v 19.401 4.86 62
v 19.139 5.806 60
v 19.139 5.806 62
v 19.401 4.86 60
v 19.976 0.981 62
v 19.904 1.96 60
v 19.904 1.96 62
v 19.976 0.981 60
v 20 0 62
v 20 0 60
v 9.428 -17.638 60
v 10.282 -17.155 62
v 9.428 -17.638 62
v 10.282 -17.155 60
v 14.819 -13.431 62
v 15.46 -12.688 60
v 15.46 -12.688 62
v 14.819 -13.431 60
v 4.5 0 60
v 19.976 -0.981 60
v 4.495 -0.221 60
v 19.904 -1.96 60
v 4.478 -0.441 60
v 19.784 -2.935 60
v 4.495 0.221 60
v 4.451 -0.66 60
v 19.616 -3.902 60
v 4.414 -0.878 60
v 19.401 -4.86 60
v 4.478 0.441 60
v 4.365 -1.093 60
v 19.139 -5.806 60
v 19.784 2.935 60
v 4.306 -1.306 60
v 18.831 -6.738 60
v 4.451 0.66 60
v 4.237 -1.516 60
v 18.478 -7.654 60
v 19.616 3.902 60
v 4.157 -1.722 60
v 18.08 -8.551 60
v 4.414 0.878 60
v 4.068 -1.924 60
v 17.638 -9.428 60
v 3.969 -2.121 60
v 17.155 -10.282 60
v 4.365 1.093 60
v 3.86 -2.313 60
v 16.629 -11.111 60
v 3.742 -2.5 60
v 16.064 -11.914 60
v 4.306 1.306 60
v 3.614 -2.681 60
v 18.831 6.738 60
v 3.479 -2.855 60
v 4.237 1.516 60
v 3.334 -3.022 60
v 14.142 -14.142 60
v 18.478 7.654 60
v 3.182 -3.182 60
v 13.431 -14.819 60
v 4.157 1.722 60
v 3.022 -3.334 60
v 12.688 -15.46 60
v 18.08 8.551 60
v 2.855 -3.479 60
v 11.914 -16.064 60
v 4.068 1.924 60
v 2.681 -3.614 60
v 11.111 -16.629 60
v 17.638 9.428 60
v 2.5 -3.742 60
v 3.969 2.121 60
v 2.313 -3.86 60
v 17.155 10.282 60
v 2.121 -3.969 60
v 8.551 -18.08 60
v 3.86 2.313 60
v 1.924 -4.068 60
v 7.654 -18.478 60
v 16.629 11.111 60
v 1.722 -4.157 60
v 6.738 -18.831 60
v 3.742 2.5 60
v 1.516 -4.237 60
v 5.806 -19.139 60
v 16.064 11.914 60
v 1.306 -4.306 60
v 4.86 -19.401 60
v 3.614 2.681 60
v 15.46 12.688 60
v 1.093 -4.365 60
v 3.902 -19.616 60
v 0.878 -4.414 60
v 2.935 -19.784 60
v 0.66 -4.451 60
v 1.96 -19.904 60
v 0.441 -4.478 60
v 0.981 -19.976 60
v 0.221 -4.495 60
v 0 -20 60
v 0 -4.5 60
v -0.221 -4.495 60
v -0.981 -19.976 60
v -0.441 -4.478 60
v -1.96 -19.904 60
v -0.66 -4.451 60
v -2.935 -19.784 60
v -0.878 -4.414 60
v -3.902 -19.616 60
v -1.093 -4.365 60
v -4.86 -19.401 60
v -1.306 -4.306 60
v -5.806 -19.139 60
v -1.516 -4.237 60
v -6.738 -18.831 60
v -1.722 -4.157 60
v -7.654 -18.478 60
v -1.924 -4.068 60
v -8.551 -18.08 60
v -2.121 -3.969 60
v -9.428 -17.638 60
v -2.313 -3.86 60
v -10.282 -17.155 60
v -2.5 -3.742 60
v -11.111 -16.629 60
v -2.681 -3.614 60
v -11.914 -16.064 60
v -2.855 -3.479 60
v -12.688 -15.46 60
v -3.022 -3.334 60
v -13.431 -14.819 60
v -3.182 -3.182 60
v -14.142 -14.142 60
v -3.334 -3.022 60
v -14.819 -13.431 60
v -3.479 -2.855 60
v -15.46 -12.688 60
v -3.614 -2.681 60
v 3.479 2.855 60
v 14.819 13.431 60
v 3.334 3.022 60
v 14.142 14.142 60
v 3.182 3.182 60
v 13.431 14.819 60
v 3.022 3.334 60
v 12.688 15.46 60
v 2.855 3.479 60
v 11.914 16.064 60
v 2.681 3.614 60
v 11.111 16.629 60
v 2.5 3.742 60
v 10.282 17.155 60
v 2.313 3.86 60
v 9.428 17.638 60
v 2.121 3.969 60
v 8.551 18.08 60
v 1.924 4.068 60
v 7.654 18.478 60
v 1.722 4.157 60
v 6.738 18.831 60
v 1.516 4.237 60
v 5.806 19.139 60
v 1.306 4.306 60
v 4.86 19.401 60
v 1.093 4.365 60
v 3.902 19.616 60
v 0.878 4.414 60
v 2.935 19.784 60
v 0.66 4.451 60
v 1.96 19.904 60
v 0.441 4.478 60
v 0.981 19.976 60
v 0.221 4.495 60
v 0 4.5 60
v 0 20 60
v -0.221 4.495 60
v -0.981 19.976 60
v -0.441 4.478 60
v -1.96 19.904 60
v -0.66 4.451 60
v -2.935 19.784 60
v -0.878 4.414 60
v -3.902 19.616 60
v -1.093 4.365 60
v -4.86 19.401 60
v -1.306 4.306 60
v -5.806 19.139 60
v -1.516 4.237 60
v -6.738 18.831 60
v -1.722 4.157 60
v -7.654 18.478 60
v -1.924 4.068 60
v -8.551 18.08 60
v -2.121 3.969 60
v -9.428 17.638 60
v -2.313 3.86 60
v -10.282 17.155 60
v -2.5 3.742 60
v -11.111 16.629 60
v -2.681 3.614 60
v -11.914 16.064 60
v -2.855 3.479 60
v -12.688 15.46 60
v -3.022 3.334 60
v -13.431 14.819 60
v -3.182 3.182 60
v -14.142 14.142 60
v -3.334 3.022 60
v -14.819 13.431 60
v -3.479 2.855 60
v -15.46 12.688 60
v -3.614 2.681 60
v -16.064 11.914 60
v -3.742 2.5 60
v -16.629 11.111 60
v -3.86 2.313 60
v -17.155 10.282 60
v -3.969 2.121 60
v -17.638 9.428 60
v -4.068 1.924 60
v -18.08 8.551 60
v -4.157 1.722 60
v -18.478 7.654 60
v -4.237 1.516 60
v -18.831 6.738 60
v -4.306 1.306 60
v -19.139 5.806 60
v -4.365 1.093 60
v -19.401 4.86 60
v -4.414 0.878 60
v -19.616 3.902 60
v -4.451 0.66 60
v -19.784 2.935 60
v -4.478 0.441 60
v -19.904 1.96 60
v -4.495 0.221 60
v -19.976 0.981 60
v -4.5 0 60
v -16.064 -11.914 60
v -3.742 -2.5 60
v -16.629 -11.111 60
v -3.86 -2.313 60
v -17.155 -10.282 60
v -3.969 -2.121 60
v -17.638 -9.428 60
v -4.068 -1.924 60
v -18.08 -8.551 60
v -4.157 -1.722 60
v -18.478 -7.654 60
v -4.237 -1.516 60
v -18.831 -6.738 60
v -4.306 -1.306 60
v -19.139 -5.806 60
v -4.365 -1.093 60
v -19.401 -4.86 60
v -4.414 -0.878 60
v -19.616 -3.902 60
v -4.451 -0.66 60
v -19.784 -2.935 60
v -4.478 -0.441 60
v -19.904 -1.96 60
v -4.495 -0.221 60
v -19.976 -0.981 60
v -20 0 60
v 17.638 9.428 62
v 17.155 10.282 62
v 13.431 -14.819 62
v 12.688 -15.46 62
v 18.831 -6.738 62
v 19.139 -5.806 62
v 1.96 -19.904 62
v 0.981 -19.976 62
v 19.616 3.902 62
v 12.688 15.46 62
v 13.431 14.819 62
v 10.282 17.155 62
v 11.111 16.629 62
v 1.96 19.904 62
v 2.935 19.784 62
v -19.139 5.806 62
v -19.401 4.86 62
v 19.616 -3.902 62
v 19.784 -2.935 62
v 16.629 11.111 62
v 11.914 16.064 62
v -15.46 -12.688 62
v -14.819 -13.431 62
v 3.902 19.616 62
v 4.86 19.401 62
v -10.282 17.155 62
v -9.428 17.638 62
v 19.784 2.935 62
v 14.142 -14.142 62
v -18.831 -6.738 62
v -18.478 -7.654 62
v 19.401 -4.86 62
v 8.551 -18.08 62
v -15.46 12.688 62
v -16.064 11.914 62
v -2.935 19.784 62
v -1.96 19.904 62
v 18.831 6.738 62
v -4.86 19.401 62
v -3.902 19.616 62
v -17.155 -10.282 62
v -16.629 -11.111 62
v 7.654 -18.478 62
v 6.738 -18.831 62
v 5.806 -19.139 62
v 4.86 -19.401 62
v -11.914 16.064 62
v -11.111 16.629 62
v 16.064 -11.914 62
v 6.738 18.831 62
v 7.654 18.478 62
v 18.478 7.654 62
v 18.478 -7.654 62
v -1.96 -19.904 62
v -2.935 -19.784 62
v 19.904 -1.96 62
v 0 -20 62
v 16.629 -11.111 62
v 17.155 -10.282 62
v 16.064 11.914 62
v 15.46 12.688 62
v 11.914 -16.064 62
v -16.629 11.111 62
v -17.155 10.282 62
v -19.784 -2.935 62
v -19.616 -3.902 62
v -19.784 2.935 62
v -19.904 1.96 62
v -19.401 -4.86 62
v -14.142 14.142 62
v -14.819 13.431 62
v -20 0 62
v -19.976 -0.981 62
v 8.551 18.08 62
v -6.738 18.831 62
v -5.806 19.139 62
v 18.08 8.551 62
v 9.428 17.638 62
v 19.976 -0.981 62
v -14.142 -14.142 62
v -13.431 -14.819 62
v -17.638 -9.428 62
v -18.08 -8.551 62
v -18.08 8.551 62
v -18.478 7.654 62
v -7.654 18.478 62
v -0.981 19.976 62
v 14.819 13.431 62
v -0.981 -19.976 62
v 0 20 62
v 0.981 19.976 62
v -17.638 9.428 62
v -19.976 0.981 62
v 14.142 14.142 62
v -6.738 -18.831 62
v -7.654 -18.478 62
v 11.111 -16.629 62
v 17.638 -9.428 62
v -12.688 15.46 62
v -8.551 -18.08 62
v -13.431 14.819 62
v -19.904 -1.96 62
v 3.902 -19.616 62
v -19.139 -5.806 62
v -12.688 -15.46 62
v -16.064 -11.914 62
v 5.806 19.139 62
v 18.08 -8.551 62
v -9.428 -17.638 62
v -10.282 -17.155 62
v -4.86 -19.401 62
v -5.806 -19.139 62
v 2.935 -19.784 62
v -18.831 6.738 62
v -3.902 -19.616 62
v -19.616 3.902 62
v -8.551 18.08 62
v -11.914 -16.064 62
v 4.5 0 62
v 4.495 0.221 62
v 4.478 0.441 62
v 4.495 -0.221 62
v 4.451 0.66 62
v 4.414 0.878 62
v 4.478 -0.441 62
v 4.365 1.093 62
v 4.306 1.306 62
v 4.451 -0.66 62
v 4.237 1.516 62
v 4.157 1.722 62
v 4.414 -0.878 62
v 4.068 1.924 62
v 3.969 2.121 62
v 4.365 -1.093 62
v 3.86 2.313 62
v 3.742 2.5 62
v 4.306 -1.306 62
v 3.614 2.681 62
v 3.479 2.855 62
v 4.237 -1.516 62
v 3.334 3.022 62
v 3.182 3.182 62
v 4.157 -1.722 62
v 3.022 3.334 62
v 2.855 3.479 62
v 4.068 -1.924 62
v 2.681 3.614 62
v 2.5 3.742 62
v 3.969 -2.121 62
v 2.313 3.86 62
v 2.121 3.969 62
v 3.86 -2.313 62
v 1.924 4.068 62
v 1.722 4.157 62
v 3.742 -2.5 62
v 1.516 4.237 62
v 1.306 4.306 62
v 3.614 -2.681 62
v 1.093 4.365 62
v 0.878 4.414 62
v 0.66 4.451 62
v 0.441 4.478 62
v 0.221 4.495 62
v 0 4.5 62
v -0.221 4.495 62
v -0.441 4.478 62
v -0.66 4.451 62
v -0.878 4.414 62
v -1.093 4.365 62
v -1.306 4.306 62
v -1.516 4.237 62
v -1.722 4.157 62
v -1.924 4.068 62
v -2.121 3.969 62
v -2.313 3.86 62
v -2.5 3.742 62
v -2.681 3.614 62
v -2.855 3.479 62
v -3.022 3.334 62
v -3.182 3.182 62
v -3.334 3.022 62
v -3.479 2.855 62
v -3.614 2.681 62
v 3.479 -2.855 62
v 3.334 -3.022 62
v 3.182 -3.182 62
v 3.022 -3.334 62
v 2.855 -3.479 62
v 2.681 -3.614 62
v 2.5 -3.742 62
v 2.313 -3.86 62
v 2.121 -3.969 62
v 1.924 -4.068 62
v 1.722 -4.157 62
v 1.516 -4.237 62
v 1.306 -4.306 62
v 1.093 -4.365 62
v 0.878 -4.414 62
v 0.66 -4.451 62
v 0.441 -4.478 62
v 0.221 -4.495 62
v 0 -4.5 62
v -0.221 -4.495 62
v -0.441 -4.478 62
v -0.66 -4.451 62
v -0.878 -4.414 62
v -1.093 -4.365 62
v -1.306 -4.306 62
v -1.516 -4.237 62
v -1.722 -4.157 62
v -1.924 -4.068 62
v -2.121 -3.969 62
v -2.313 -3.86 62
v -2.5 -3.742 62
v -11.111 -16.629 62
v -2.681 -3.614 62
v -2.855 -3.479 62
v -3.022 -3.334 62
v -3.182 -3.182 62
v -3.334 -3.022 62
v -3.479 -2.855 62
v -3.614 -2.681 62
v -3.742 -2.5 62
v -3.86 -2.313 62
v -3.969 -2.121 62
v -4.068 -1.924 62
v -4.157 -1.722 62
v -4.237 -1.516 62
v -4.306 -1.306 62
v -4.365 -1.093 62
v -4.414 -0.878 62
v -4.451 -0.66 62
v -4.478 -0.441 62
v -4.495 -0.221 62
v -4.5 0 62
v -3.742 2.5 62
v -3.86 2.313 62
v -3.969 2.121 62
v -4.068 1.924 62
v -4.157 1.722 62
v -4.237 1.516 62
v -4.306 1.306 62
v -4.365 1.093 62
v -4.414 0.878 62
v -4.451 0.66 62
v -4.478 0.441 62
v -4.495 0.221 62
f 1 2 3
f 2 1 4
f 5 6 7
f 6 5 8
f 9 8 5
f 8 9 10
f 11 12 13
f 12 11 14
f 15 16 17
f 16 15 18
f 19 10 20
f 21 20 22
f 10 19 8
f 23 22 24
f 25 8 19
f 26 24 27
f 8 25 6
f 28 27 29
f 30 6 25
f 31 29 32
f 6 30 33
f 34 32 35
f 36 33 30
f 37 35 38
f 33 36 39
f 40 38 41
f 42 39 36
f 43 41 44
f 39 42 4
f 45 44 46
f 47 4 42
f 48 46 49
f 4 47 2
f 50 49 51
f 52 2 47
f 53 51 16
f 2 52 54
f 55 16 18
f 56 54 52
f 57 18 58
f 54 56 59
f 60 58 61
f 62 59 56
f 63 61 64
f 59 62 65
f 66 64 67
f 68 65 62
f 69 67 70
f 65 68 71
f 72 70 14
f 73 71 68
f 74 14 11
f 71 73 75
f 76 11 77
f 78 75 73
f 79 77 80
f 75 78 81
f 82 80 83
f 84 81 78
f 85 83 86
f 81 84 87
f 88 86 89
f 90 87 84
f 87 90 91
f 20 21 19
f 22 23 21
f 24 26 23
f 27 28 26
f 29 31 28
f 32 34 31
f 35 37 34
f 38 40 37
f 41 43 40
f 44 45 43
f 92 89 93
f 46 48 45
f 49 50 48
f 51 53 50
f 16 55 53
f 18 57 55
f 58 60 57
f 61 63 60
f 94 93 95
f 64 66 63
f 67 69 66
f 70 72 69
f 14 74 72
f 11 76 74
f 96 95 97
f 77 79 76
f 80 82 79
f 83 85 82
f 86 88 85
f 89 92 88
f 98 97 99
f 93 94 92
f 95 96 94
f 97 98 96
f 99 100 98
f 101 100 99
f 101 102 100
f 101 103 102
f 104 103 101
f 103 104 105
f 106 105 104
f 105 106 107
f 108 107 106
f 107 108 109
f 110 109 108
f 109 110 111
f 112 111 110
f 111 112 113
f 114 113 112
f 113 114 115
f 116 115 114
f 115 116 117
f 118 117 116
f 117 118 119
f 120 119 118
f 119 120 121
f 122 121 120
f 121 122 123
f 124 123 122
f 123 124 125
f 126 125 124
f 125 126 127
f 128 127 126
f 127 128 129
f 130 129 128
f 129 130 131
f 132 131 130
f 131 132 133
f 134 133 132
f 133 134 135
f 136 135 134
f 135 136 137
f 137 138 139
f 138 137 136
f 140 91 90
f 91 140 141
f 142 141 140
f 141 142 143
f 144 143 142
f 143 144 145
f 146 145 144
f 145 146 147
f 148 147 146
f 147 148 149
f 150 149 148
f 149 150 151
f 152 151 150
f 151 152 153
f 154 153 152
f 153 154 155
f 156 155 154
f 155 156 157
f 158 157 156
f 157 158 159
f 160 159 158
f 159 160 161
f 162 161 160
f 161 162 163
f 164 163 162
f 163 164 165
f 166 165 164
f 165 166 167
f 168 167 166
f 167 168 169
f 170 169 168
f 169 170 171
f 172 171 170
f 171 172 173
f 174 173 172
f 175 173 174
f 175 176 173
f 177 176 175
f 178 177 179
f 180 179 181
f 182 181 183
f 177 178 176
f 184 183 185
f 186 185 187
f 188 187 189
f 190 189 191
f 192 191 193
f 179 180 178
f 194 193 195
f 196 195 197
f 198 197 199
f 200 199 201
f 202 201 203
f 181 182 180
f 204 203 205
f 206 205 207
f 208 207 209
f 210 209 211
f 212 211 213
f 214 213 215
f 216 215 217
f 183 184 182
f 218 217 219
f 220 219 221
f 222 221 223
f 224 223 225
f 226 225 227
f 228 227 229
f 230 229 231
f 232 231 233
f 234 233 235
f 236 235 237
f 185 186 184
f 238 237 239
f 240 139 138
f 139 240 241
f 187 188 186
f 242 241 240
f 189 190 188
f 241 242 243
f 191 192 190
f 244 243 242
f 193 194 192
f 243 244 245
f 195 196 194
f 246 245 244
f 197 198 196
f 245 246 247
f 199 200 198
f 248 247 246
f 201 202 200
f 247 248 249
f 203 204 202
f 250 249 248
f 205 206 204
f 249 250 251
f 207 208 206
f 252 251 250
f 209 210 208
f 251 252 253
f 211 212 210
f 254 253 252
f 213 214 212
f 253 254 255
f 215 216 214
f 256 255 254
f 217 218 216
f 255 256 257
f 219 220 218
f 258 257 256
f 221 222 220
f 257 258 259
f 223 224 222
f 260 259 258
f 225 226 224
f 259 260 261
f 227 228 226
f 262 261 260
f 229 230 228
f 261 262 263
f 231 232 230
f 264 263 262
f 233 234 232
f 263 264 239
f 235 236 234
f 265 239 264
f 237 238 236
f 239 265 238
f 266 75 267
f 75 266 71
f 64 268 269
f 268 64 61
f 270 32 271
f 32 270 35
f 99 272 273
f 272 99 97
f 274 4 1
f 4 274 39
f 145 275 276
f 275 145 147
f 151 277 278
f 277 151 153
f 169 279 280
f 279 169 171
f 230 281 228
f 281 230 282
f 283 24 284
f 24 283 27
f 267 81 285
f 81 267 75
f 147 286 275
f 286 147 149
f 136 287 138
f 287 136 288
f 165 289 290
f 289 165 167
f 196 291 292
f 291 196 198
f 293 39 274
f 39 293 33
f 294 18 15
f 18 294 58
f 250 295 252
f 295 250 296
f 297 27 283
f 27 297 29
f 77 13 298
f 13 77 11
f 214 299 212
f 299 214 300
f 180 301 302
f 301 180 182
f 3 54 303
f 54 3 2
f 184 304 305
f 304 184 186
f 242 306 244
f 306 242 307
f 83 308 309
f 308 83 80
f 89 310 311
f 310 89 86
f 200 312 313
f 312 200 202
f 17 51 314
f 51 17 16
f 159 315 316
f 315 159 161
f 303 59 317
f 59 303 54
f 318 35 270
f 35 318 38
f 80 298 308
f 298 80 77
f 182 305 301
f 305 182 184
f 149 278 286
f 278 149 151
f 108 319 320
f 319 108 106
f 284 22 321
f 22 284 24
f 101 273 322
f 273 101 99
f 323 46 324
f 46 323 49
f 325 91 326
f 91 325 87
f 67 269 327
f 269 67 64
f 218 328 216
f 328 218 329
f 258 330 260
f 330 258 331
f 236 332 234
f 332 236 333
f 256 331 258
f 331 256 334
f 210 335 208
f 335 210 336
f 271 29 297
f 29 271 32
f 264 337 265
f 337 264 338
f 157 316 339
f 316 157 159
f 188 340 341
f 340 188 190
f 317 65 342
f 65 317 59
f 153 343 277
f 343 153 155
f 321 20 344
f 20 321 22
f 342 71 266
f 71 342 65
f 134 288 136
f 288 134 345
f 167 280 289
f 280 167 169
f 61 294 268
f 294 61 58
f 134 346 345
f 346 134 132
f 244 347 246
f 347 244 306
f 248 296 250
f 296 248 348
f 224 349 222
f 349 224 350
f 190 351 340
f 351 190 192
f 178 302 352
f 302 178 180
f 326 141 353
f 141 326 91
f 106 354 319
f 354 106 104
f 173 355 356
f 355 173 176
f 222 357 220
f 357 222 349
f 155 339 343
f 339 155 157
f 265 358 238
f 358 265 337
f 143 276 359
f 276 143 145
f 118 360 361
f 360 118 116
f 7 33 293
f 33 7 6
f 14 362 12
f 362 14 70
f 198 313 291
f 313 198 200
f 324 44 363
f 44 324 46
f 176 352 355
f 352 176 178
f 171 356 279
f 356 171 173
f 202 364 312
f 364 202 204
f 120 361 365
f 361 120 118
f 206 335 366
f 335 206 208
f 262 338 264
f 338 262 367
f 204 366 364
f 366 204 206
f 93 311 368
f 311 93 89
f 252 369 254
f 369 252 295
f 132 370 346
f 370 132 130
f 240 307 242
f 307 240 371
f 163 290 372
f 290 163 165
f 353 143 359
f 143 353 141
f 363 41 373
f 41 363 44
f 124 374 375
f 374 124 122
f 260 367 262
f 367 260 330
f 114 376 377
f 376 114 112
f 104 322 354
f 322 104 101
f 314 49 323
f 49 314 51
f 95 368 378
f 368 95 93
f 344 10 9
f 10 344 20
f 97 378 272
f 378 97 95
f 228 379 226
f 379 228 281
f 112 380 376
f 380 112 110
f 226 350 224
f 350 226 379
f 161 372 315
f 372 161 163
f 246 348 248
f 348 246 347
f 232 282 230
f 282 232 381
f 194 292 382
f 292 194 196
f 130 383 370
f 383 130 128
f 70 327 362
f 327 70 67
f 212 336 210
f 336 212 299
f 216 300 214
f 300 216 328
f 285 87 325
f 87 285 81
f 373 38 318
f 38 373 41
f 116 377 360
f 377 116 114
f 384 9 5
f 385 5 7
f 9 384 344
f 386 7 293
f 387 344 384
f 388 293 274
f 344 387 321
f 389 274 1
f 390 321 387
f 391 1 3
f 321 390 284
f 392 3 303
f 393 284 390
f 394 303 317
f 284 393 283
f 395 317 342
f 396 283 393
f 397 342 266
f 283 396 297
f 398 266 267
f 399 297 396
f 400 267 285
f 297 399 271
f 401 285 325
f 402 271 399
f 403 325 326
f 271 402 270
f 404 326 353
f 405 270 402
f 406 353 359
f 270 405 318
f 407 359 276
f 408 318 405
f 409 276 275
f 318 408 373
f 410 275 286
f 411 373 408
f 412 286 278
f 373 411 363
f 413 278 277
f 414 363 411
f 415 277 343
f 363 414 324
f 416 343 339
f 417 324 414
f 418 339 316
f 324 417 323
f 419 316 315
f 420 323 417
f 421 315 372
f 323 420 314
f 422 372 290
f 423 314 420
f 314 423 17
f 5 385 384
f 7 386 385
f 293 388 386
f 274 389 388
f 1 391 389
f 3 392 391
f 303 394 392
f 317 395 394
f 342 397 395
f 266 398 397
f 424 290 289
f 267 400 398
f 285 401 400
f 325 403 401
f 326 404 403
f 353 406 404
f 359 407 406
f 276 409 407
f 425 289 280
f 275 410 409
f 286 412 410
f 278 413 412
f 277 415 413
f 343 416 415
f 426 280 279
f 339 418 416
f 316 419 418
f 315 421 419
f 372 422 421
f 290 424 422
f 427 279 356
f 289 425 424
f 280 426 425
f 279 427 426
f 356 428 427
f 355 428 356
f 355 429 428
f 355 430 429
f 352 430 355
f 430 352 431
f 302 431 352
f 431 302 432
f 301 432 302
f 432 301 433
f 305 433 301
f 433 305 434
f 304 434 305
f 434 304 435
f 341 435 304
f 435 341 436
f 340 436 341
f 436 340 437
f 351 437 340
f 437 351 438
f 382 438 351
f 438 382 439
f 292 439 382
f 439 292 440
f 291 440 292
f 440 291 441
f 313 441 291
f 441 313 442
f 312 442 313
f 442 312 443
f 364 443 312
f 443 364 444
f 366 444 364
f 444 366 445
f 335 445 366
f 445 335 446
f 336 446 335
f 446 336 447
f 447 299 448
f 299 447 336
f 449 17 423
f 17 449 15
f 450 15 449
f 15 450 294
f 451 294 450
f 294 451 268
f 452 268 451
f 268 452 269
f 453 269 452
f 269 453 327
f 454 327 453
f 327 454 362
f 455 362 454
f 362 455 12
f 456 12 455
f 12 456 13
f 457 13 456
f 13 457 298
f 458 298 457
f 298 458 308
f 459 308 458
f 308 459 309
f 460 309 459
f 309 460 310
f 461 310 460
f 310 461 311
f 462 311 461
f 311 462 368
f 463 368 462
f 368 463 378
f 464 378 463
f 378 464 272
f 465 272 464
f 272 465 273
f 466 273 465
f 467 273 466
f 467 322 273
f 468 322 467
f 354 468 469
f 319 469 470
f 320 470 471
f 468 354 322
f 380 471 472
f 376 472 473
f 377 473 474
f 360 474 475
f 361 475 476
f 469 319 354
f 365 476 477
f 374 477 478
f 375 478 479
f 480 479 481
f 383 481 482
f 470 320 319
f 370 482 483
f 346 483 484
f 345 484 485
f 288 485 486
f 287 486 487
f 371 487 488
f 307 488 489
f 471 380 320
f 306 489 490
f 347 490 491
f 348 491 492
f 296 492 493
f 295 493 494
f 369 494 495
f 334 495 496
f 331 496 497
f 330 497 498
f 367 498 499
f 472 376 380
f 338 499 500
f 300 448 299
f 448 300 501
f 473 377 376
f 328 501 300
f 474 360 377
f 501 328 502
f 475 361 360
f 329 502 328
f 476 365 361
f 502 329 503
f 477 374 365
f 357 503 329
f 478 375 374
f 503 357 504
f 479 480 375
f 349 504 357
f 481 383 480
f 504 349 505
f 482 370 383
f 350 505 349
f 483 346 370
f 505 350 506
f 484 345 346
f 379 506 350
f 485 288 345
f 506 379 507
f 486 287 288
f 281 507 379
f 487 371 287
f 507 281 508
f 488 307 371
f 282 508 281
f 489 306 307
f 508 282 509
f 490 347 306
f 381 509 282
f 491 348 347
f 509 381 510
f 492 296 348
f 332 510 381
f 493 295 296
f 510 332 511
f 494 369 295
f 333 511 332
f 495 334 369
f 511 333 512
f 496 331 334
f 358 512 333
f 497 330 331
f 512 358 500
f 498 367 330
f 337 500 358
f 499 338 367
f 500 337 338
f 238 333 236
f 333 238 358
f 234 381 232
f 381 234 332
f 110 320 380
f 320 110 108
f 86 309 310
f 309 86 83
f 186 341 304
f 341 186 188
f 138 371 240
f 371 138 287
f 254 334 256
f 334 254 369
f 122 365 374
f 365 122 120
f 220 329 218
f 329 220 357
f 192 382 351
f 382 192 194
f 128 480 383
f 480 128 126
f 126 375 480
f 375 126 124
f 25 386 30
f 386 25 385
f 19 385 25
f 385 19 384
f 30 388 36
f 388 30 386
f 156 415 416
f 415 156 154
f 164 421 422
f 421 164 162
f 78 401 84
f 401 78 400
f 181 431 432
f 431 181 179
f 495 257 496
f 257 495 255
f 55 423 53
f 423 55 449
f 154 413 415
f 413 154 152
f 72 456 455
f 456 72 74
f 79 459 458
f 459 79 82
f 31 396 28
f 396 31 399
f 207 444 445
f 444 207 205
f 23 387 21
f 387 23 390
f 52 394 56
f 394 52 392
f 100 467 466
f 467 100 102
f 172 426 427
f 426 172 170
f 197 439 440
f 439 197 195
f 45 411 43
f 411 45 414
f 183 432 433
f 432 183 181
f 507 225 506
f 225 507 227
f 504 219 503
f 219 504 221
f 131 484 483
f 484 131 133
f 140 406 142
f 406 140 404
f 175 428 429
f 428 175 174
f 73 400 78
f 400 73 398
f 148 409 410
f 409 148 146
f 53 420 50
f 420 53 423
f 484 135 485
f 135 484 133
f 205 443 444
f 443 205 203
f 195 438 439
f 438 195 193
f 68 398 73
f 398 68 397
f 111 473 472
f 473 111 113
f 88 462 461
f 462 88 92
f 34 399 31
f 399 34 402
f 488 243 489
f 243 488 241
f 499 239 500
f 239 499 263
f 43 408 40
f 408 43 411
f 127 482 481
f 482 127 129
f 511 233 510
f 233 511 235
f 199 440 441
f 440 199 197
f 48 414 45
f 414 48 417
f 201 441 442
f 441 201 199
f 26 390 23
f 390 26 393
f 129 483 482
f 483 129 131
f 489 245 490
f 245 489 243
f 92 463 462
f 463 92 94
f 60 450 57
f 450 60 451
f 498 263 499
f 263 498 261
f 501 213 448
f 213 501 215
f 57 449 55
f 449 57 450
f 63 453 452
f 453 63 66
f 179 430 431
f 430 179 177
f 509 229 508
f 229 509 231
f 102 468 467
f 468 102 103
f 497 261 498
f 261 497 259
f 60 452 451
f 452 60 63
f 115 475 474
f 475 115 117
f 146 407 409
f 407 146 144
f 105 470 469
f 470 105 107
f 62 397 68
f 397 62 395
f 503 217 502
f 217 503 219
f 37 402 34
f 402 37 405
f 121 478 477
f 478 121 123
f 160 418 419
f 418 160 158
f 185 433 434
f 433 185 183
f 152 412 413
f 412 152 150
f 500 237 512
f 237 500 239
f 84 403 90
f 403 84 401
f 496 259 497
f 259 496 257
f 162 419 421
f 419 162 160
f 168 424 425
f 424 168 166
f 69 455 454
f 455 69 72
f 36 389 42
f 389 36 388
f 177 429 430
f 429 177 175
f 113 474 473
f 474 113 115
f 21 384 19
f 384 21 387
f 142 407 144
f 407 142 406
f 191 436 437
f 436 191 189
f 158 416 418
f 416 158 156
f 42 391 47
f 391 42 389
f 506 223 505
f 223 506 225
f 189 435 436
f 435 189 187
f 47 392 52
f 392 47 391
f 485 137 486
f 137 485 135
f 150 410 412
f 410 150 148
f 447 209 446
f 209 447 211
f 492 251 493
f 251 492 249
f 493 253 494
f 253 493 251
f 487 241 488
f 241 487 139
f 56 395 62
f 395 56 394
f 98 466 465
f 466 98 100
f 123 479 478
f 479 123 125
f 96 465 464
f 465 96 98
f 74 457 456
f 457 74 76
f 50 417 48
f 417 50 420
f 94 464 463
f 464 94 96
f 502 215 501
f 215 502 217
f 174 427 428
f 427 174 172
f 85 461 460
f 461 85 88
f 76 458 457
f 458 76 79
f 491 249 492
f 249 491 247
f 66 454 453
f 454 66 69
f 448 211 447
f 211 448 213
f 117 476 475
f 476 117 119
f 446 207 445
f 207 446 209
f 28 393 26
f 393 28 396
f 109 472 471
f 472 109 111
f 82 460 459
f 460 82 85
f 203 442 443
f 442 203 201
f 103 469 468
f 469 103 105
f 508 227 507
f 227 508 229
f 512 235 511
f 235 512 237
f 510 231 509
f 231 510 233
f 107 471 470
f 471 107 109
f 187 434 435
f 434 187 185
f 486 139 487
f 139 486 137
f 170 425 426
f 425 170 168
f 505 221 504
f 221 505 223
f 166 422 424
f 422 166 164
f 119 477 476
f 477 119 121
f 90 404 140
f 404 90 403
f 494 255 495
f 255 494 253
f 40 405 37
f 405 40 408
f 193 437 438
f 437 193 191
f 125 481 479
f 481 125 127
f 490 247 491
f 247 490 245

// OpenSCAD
// file: common_params.scad
cylinder_radius = 20.000000;
cylinder_height = 60.000000;
wall_thickness = 2.000000;

cap_thickness = 2.000000;

rod_radius = 2.000000;
rod_height = 50.000000;

ring_outer_radius = 8.000000;
ring_inner_radius = 4.000000;
ring_thickness = 3.000000;
ring_z = 40.000000;

$fn = 128;
// main file
include <common_params.scad>;

hole_radius = 4.500000;

translate([0, 0, cylinder_height])
difference() {
    cylinder(h = cap_thickness, r = cylinder_radius);
    translate([0, 0, -0.1])
        cylinder(h = cap_thickness + 0.2, r = hole_radius);
}
